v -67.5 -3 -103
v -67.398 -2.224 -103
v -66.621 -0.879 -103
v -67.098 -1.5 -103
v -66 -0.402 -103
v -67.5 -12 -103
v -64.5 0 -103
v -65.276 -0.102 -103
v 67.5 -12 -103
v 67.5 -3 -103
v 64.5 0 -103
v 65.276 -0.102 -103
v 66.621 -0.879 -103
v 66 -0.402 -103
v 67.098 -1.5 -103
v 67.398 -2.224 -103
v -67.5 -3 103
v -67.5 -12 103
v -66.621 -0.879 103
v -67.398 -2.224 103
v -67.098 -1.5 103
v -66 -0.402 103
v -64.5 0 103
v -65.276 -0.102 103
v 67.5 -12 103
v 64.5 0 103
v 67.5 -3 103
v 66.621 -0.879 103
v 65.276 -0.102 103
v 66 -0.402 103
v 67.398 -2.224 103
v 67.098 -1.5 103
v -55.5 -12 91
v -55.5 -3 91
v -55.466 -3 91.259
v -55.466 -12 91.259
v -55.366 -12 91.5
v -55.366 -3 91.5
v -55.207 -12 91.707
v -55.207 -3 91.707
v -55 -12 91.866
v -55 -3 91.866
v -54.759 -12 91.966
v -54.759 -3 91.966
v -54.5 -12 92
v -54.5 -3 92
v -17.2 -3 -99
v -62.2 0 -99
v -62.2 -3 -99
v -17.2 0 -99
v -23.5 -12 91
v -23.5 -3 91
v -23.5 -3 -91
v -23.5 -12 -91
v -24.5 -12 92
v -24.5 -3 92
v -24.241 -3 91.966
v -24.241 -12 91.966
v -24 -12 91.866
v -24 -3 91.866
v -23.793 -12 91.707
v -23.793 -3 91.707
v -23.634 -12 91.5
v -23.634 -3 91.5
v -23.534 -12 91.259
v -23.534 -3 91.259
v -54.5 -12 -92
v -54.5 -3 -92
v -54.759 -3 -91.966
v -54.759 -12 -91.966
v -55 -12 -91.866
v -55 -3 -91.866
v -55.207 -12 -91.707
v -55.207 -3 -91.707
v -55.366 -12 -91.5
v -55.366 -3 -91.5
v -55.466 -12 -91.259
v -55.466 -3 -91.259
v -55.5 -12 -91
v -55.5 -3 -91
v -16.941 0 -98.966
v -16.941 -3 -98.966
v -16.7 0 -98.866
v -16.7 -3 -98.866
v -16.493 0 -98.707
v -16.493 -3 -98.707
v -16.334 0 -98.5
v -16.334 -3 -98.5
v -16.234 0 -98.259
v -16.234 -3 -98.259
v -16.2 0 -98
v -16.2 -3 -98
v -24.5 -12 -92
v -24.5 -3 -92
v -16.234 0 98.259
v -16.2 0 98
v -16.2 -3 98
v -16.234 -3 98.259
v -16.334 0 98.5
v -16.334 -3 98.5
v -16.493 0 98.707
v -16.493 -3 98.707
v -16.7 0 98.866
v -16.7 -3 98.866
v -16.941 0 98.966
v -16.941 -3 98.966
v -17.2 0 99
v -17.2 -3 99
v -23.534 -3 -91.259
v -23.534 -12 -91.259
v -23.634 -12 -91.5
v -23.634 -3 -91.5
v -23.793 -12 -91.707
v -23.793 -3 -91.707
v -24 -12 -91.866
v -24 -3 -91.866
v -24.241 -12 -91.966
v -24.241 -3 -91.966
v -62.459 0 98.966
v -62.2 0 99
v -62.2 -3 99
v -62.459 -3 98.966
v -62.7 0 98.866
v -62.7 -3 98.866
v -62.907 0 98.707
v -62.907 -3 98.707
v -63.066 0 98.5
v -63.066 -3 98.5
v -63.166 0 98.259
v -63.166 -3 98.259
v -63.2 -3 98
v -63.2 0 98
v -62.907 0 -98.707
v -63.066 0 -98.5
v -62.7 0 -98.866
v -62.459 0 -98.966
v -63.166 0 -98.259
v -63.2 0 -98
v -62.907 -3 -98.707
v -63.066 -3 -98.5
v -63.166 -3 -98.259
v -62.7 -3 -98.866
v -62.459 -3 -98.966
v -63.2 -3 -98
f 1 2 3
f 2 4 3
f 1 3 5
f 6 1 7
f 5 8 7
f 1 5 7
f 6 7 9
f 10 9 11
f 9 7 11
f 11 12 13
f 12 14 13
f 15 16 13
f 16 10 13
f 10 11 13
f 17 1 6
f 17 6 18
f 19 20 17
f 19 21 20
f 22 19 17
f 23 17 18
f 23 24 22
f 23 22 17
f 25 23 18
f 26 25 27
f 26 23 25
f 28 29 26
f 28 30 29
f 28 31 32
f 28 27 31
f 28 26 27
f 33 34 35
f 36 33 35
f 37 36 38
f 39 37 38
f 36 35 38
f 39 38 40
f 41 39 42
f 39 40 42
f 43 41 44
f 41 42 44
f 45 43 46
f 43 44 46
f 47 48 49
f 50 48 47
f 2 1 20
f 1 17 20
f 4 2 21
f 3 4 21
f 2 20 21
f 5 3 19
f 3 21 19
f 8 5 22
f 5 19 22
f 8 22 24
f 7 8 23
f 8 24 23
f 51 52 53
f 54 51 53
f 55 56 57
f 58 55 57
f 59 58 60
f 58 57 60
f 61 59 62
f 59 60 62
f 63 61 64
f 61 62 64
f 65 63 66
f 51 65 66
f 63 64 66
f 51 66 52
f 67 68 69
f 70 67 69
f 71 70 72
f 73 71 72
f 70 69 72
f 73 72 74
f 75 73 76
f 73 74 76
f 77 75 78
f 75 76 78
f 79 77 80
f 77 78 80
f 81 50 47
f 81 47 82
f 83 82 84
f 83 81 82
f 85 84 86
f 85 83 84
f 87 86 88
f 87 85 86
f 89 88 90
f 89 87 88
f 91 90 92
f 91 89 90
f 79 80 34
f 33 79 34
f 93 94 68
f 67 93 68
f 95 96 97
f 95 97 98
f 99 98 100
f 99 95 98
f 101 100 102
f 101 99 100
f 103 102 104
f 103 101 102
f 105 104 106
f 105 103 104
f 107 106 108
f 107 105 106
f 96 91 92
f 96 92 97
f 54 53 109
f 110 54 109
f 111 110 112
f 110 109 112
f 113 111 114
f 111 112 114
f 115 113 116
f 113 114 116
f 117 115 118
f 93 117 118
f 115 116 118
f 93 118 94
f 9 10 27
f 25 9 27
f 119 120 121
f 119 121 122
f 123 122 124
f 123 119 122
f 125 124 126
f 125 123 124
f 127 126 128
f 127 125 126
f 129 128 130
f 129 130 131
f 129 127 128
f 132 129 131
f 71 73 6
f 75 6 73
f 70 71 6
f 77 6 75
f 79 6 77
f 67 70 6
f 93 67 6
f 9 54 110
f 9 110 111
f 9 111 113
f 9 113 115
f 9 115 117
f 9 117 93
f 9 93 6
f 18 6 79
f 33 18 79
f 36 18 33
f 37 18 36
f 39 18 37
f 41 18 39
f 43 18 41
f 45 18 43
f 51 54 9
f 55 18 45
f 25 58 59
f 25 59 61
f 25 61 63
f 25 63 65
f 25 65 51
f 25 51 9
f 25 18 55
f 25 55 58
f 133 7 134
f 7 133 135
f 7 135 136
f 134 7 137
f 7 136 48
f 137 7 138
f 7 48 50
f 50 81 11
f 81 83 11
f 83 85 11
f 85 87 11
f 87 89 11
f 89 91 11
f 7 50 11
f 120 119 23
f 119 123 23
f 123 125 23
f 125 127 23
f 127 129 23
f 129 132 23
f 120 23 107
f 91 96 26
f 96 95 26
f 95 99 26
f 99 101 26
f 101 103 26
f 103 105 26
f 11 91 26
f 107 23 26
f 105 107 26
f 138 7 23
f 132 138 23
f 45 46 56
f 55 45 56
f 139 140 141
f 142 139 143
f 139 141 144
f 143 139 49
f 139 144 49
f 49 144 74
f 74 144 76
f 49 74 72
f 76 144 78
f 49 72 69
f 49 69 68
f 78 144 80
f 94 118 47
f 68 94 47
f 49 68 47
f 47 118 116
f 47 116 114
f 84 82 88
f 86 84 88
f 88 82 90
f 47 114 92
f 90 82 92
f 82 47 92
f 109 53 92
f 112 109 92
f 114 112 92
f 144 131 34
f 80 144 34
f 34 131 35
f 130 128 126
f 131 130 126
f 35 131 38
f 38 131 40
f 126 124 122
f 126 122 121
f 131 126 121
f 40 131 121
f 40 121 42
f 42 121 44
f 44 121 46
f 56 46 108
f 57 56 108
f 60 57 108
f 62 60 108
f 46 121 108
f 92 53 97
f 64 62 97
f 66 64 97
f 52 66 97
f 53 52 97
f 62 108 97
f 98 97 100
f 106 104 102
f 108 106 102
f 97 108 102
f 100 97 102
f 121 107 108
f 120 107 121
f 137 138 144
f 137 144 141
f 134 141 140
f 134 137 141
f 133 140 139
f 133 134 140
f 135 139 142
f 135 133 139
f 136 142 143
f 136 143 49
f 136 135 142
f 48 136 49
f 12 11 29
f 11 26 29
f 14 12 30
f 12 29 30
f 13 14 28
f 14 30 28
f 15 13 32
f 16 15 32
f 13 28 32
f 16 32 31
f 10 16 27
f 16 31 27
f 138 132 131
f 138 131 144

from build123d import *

# Parameters (mm, degrees)
F0_W     = 135
F0_H     = 206
F1_DEPTH = 12
F2_DEPTH = 3
F3_R     = 3


with BuildPart() as f1:
    # F0 (on Front) → F1 (new body)
    with BuildSketch(Plane.XZ):
        Rectangle(F0_W, F0_H)
        with BuildLine():
            ThreePointArc((-17.2, 99), (-16.492893, 98.707107), (-16.2, 98))
            Line((-16.2, 98), (-16.2, -98))
            ThreePointArc((-16.2, -98), (-16.492893, -98.707107), (-17.2, -99))
            Line((-17.2, -99), (-62.2, -99))
            ThreePointArc((-62.2, -99), (-62.907107, -98.707107), (-63.2, -98))
            Line((-63.2, -98), (-63.2, 98))
            ThreePointArc((-63.2, 98), (-62.907107, 98.707107), (-62.2, 99))
            Line((-62.2, 99), (-17.2, 99))
        make_face(mode=Mode.SUBTRACT)
        with BuildLine():
            Line((-16.2, -98), (-16.2, 98))
            ThreePointArc((-16.2, 98), (-16.492893, 98.707107), (-17.2, 99))
            Line((-17.2, 99), (-62.2, 99))
            ThreePointArc((-62.2, 99), (-62.907107, 98.707107), (-63.2, 98))
            Line((-63.2, 98), (-63.2, -98))
            ThreePointArc((-63.2, -98), (-62.907107, -98.707107), (-62.2, -99))
            Line((-62.2, -99), (-17.2, -99))
            ThreePointArc((-17.2, -99), (-16.492893, -98.707107), (-16.2, -98))
        make_face()
        with BuildLine():
            ThreePointArc((-55.5, 91), (-55.207107, 91.707107), (-54.5, 92))
            Line((-54.5, 92), (-24.5, 92))
            ThreePointArc((-24.5, 92), (-23.792893, 91.707107), (-23.5, 91))
            Line((-23.5, 91), (-23.5, -91))
            ThreePointArc((-23.5, -91), (-23.792893, -91.707107), (-24.5, -92))
            Line((-24.5, -92), (-54.5, -92))
            ThreePointArc((-54.5, -92), (-55.207107, -91.707107), (-55.5, -91))
            Line((-55.5, -91), (-55.5, 91))
        make_face(mode=Mode.SUBTRACT)
    extrude(amount=F1_DEPTH)

    # F0 (on Front) → F2 (cut)
    with BuildSketch(Plane.XZ):
        with BuildLine():
            Line((-16.2, -98), (-16.2, 98))
            ThreePointArc((-16.2, 98), (-16.492893, 98.707107), (-17.2, 99))
            Line((-17.2, 99), (-62.2, 99))
            ThreePointArc((-62.2, 99), (-62.907107, 98.707107), (-63.2, 98))
            Line((-63.2, 98), (-63.2, -98))
            ThreePointArc((-63.2, -98), (-62.907107, -98.707107), (-62.2, -99))
            Line((-62.2, -99), (-17.2, -99))
            ThreePointArc((-17.2, -99), (-16.492893, -98.707107), (-16.2, -98))
        make_face()
        with BuildLine():
            ThreePointArc((-55.5, 91), (-55.207107, 91.707107), (-54.5, 92))
            Line((-54.5, 92), (-24.5, 92))
            ThreePointArc((-24.5, 92), (-23.792893, 91.707107), (-23.5, 91))
            Line((-23.5, 91), (-23.5, -91))
            ThreePointArc((-23.5, -91), (-23.792893, -91.707107), (-24.5, -92))
            Line((-24.5, -92), (-54.5, -92))
            ThreePointArc((-54.5, -92), (-55.207107, -91.707107), (-55.5, -91))
            Line((-55.5, -91), (-55.5, 91))
        make_face(mode=Mode.SUBTRACT)
    extrude(amount=F2_DEPTH, mode=Mode.SUBTRACT)

    # F3
    f3_edges = [f1.edges().sort_by_distance(p)[0] for p in [
        (67.5, 0, 0),
        (-67.5, 0, 0),
    ]]
    fillet(f3_edges, radius=F3_R)


solid = f1.part
